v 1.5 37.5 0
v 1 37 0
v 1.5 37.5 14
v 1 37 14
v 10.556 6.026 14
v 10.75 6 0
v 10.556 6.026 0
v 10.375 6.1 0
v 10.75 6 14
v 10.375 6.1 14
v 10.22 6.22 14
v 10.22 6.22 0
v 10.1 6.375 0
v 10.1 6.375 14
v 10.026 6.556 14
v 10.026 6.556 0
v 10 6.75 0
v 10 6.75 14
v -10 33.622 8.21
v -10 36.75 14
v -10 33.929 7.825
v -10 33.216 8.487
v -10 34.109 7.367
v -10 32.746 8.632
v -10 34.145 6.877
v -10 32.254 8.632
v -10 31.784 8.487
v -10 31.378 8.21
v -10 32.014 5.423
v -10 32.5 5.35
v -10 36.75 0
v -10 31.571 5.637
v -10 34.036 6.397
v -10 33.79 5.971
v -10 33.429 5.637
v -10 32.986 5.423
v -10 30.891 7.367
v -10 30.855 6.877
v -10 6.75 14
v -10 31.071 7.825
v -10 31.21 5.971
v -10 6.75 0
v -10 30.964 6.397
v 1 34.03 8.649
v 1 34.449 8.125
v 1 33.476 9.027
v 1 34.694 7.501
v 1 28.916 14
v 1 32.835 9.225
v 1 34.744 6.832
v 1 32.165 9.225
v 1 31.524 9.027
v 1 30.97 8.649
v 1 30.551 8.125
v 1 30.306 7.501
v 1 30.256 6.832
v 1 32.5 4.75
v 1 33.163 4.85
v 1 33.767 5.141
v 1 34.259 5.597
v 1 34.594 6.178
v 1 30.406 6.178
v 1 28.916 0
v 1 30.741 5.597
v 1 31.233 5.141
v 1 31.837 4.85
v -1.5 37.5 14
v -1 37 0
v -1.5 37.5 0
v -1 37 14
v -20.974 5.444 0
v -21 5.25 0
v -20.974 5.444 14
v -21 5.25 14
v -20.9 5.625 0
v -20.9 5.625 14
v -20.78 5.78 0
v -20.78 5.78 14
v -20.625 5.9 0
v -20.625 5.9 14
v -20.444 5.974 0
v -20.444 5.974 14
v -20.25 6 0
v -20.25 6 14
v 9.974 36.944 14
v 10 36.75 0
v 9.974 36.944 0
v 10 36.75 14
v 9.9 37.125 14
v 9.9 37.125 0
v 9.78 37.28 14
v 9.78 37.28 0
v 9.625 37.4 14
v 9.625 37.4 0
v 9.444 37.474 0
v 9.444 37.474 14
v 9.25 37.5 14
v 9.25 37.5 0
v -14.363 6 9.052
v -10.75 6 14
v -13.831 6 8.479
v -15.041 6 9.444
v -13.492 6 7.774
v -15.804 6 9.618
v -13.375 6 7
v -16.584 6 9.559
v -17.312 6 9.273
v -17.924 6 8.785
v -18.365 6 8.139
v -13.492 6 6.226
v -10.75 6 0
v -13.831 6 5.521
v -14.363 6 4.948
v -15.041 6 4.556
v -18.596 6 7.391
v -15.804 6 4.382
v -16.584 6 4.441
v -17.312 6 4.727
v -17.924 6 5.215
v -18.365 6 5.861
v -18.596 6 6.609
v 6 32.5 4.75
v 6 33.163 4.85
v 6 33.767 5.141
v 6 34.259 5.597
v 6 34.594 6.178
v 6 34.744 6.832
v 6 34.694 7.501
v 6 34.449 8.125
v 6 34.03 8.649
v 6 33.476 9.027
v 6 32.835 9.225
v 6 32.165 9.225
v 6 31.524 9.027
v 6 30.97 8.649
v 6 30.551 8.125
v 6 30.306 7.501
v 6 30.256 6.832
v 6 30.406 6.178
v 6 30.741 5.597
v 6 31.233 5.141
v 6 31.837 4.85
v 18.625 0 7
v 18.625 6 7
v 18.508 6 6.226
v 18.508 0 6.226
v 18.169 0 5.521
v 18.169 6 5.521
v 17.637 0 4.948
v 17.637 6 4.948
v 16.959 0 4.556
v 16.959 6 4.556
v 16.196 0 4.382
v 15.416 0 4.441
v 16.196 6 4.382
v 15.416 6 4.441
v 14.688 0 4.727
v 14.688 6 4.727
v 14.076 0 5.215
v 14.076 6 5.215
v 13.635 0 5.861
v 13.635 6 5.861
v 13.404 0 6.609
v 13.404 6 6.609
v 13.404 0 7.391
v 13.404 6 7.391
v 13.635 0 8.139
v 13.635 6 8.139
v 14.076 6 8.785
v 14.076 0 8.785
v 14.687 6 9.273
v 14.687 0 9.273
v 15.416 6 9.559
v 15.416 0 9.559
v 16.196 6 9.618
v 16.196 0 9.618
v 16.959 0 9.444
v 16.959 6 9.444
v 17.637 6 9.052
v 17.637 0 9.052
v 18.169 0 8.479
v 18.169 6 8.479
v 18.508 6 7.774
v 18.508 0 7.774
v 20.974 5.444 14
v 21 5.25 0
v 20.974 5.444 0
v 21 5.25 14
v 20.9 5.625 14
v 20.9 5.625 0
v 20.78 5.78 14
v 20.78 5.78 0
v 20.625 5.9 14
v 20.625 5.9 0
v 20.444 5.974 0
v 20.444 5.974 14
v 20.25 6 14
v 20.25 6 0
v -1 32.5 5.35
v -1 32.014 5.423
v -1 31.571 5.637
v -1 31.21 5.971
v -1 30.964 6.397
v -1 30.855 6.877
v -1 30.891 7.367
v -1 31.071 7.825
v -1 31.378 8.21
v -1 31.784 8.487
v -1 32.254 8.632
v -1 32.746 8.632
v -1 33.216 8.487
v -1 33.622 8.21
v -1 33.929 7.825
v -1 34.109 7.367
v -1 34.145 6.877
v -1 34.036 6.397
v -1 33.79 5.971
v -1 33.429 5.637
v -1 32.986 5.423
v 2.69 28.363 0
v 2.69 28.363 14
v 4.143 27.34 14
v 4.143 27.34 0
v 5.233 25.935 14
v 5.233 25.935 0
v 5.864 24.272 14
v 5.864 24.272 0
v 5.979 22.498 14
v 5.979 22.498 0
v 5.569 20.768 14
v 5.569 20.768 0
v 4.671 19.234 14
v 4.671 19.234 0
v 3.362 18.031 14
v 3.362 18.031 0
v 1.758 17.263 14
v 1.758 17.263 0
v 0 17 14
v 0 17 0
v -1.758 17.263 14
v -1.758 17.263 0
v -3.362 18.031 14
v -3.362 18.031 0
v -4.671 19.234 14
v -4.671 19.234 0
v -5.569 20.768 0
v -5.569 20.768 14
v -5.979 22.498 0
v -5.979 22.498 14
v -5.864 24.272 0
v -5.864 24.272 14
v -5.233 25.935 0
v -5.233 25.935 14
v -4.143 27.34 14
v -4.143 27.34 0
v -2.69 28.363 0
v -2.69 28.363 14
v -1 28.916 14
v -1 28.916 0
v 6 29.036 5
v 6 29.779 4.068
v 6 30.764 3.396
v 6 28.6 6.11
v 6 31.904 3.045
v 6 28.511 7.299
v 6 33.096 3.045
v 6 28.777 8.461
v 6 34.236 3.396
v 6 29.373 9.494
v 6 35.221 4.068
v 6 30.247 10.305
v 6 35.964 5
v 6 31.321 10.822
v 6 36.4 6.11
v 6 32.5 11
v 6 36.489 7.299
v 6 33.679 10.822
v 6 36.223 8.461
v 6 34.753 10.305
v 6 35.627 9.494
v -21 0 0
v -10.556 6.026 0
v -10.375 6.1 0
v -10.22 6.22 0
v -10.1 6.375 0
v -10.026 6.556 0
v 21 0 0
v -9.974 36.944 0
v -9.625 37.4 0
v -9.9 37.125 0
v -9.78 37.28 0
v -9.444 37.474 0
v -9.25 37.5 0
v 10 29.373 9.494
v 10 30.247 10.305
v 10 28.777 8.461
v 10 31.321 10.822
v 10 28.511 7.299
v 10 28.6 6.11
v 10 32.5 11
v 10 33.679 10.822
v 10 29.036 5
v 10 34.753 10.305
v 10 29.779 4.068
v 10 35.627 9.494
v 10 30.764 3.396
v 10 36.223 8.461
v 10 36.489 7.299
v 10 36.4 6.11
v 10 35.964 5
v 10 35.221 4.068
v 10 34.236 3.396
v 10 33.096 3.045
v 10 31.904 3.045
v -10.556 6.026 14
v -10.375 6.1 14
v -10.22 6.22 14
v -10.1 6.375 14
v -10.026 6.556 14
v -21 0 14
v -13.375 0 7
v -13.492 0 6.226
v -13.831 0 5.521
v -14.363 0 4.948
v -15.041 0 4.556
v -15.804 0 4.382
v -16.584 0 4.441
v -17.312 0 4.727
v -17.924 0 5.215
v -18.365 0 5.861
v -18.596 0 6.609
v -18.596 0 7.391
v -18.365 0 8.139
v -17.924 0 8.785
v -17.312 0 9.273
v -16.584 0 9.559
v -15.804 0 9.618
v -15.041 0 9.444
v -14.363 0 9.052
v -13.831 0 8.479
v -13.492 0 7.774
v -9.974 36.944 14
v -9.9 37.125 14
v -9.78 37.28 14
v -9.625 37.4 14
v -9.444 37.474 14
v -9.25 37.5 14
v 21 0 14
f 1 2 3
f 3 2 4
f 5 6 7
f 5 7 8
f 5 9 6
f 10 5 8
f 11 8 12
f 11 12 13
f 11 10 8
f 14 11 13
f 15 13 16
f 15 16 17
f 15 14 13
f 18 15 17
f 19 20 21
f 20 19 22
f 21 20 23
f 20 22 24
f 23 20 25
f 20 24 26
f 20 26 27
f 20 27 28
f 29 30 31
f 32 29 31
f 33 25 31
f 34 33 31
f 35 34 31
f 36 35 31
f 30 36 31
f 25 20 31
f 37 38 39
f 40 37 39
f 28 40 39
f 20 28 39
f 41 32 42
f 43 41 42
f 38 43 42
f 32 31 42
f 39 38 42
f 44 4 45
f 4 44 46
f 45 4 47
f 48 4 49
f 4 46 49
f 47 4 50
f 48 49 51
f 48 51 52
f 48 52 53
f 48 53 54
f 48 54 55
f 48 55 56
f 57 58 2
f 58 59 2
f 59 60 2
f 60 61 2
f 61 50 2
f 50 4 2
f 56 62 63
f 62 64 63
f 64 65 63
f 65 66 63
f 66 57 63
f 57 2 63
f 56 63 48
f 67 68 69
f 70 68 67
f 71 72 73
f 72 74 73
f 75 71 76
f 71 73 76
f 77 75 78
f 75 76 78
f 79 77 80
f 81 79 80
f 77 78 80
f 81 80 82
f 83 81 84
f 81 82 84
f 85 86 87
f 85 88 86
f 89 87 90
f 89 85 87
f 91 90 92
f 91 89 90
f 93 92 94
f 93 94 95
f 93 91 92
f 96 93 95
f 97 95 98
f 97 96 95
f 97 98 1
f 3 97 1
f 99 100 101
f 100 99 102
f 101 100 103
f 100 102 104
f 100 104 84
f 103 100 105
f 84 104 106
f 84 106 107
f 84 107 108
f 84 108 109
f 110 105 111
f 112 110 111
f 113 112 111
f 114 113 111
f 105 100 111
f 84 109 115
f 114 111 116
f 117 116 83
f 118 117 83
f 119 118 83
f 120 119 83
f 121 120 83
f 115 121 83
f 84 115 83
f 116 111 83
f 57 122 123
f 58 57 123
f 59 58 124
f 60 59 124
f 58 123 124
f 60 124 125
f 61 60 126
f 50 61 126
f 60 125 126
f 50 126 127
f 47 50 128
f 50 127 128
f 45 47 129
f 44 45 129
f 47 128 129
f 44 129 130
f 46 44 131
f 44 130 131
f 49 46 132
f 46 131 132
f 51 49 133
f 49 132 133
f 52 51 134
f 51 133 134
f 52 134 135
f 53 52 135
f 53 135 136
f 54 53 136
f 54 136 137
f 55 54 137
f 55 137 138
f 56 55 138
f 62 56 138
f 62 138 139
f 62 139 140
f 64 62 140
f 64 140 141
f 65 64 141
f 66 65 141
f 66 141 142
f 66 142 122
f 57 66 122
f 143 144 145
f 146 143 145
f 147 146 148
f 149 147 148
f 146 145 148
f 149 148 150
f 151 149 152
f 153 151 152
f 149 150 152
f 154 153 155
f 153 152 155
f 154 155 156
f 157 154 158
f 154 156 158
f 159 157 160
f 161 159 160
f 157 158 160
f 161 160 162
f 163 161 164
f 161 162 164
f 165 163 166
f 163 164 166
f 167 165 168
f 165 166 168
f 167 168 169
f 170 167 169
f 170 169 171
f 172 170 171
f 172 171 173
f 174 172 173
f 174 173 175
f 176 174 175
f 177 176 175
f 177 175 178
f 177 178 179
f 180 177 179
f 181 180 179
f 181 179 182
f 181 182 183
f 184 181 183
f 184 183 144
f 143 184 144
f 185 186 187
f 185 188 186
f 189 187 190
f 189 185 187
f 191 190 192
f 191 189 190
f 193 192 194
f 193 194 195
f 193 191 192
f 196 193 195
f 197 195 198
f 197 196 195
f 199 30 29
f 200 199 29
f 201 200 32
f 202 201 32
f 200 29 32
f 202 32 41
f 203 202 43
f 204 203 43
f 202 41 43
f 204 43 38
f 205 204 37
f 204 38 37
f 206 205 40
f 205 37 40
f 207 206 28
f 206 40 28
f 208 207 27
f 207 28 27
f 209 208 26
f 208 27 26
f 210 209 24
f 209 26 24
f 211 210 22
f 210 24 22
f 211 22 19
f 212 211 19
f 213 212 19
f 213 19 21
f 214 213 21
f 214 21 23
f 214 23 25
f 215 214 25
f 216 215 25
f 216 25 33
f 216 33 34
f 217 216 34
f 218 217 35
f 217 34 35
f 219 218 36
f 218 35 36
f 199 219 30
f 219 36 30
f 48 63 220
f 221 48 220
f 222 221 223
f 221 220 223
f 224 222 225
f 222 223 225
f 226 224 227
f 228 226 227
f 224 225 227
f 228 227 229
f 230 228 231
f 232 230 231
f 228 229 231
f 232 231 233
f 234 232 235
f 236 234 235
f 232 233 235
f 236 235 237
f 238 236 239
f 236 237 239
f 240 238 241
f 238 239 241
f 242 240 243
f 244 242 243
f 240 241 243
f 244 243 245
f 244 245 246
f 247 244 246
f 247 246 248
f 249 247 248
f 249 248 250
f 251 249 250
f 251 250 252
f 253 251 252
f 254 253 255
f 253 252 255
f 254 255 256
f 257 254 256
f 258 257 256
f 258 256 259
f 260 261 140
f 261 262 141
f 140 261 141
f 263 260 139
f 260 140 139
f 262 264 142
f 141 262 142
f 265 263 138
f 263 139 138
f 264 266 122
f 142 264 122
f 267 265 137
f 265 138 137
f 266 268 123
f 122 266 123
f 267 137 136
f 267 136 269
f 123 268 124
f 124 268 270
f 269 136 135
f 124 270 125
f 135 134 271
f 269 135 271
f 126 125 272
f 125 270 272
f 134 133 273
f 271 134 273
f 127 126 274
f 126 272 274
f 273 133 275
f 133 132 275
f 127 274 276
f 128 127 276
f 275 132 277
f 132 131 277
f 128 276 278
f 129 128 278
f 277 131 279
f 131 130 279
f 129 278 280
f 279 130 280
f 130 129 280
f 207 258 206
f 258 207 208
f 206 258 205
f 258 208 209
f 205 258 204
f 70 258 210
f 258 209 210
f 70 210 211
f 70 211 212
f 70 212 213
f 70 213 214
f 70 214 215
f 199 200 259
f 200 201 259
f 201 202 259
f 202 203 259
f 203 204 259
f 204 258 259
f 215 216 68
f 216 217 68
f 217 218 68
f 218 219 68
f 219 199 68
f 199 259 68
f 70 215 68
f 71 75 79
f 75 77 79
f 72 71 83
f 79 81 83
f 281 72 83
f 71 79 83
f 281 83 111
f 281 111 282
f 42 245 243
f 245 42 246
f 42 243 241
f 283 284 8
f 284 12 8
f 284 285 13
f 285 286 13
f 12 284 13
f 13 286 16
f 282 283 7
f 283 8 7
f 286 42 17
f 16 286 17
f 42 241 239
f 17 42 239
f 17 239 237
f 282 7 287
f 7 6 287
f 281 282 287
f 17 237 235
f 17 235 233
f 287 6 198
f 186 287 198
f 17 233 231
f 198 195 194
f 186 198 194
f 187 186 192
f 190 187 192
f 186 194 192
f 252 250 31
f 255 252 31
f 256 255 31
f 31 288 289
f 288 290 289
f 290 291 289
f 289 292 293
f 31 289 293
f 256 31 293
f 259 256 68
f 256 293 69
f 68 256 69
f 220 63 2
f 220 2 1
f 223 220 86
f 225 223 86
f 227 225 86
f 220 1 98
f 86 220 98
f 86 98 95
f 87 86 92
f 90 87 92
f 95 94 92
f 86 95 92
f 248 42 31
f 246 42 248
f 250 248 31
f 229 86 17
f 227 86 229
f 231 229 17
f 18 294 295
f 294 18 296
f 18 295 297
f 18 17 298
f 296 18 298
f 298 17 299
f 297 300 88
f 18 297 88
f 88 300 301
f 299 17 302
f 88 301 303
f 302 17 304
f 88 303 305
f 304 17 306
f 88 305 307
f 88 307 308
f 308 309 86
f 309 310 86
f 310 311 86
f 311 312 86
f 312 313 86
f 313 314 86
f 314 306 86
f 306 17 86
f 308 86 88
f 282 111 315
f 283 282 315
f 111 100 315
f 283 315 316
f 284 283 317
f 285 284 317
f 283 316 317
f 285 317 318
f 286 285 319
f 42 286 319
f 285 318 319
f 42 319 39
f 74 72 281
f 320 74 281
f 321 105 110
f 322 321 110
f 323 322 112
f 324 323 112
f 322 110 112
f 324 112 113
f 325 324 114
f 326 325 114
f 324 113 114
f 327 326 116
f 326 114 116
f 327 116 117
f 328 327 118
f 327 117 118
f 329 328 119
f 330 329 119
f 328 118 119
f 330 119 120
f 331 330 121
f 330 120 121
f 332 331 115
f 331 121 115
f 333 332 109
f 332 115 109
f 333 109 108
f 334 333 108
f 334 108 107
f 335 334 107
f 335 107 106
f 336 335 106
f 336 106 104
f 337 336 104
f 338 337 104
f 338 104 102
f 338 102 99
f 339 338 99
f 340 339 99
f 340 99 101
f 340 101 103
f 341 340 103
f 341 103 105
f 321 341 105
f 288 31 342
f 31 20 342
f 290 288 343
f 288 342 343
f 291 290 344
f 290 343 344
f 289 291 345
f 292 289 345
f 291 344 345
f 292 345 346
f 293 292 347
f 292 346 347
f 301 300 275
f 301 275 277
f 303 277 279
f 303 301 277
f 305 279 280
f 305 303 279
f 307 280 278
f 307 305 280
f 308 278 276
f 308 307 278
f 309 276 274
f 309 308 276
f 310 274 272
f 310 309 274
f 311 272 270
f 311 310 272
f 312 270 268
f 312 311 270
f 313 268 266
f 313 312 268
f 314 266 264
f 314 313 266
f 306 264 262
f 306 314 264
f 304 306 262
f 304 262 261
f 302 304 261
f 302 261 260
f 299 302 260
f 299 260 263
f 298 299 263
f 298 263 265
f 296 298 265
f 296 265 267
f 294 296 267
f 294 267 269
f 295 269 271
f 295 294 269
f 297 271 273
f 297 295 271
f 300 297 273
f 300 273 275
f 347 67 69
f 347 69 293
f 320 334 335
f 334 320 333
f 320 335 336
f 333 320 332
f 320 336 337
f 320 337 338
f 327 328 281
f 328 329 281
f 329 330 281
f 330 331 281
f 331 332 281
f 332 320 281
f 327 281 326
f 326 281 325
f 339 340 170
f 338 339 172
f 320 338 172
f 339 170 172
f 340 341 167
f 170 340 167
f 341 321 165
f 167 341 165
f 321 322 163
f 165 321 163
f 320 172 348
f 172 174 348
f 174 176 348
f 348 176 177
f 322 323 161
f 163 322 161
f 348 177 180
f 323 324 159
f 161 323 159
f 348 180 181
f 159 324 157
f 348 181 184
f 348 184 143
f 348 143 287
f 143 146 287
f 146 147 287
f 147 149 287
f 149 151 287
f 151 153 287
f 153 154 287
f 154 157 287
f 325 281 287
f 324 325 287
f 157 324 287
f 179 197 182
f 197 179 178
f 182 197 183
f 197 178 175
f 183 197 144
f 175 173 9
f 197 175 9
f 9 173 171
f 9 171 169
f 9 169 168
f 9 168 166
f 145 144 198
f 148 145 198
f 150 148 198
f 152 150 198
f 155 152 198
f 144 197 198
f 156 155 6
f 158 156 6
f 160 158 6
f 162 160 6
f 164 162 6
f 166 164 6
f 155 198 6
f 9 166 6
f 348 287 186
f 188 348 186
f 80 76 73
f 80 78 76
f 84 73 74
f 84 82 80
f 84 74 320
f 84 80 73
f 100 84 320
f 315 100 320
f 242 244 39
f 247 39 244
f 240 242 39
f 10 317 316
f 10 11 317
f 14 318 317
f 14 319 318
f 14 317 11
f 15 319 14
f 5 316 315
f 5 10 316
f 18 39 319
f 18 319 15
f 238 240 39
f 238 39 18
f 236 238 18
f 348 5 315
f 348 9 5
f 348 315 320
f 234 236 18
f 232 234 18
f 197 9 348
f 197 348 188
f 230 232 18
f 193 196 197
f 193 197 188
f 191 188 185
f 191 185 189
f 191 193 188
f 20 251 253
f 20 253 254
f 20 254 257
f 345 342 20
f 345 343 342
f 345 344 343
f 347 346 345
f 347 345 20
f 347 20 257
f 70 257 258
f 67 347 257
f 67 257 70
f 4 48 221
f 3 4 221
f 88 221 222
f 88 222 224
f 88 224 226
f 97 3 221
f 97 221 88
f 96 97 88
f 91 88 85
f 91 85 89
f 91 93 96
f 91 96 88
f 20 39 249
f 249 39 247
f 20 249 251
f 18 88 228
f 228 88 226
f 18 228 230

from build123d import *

# Parameters (mm, degrees)
SALIENTE_EXTRUIR1_DEPTH = 14
CROQUIS16_W             = 1.65
CROQUIS16_H             = 20
CORTAR_EXTRUIR3_REACH   = 8
CROQUIS4_R              = 2.625
REDONDEO0_75MM_R        = 0.75
CHAFL_N0_5MM_SIZE       = 0.5
CORTAR_EXTRUIR5_REACH   = 33
CROQUIS24_R             = 2.25
CROQUIS23_R             = 4
CORTAR_EXTRUIR4_DEPTH   = 4


with BuildPart() as part:
    # Croquis1 → Saliente-Extruir1 (new body)
    with BuildSketch(Plane.XY):
        with BuildLine():
            Line((-21, 6), (-21, 0))
            Line((-21, 0), (21, 0))
            Line((21, 0), (21, 6))
            Line((21, 6), (10, 6))
            Line((10, 6), (10, 37.5))
            Line((10, 37.5), (1, 37.5))
            Line((1, 37.5), (1, 28.916079783))
            ThreePointArc((1, 28.916079783), (0, 17), (-1, 28.916079783))
            Line((-1, 28.916079783), (-1, 37.5))
            Line((-1, 37.5), (-10, 37.5))
            Line((-10, 37.5), (-10, 6))
            Line((-10, 6), (-21, 6))
        make_face()
    extrude(amount=SALIENTE_EXTRUIR1_DEPTH)

    # Croquis16 → Taladro roscado M43 (revolve, cut)
    with BuildSketch(Plane(origin=(-1, 32.5, 7), x_dir=(0, 0, -1), z_dir=(0, 1, 0))):
        with Locations((0.825, 10)):
            Rectangle(CROQUIS16_W, CROQUIS16_H)
    revolve(axis=Axis((5.35, 32.5, 7), (-1, 0, 0)), mode=Mode.SUBTRACT)

    # Croquis4 → Cortar-Extruir3 (cut, up to next)
    with BuildSketch(Plane(origin=(0, 6, 0), x_dir=(1, 0, 0), z_dir=(0, 1, 0)), mode=Mode.PRIVATE) as cortar_extruir3_sk1:
        with Locations((-16, -7)):
            Circle(CROQUIS4_R)
    cortar_extruir3_tool1 = extrude(cortar_extruir3_sk1.sketch, amount=-CORTAR_EXTRUIR3_REACH, mode=Mode.PRIVATE) & part.part
    add(cortar_extruir3_tool1.solids().sort_by_distance((-16, 6, 7))[0], mode=Mode.SUBTRACT)
    # Croquis4 → Cortar-Extruir3 (cut, up to next)
    with BuildSketch(Plane(origin=(0, 6, 0), x_dir=(1, 0, 0), z_dir=(0, 1, 0)), mode=Mode.PRIVATE) as cortar_extruir3_sk2:
        with Locations((16, -7)):
            Circle(CROQUIS4_R)
    cortar_extruir3_tool2 = extrude(cortar_extruir3_sk2.sketch, amount=-CORTAR_EXTRUIR3_REACH, mode=Mode.PRIVATE) & part.part
    add(cortar_extruir3_tool2.solids().sort_by_distance((16, 6, 7))[0], mode=Mode.SUBTRACT)

    # Redondeo0,75mm
    redondeo0_75mm_edges = [part.edges().sort_by_distance(p)[0] for p in [
        (10, 37.5, 7),
        (10, 6, 7),
        (21, 6, 7),
        (-21, 6, 7),
        (-10, 6, 7),
        (-10, 37.5, 7),
    ]]
    fillet(redondeo0_75mm_edges, radius=REDONDEO0_75MM_R)

    # Chaflán0,5mm
    chafl_n0_5mm_edges = [part.edges().sort_by_distance(p)[0] for p in [
        (1, 37.5, 7),
        (-1, 37.5, 7),
    ]]
    chamfer(chafl_n0_5mm_edges, length=CHAFL_N0_5MM_SIZE)

    # Croquis24 → Cortar-Extruir5 (cut, up to next)
    with BuildSketch(Plane(origin=(10, 0, 0), x_dir=(0, 0, -1), z_dir=(1, 0, 0)), mode=Mode.PRIVATE) as cortar_extruir5_sk1:
        with Locations((-7, 32.5)):
            Circle(CROQUIS24_R)
    cortar_extruir5_tool1 = extrude(cortar_extruir5_sk1.sketch, amount=-CORTAR_EXTRUIR5_REACH, mode=Mode.PRIVATE) & part.part
    add(cortar_extruir5_tool1.solids().sort_by_distance((10, 32.5, 7))[0], mode=Mode.SUBTRACT)

    # Croquis23 → Cortar-Extruir4 (cut)
    with BuildSketch(Plane.ZY.offset(-10)):
        with Locations((7, 32.5)):
            Circle(CROQUIS23_R)
    extrude(amount=CORTAR_EXTRUIR4_DEPTH, mode=Mode.SUBTRACT)


solid = part.part
